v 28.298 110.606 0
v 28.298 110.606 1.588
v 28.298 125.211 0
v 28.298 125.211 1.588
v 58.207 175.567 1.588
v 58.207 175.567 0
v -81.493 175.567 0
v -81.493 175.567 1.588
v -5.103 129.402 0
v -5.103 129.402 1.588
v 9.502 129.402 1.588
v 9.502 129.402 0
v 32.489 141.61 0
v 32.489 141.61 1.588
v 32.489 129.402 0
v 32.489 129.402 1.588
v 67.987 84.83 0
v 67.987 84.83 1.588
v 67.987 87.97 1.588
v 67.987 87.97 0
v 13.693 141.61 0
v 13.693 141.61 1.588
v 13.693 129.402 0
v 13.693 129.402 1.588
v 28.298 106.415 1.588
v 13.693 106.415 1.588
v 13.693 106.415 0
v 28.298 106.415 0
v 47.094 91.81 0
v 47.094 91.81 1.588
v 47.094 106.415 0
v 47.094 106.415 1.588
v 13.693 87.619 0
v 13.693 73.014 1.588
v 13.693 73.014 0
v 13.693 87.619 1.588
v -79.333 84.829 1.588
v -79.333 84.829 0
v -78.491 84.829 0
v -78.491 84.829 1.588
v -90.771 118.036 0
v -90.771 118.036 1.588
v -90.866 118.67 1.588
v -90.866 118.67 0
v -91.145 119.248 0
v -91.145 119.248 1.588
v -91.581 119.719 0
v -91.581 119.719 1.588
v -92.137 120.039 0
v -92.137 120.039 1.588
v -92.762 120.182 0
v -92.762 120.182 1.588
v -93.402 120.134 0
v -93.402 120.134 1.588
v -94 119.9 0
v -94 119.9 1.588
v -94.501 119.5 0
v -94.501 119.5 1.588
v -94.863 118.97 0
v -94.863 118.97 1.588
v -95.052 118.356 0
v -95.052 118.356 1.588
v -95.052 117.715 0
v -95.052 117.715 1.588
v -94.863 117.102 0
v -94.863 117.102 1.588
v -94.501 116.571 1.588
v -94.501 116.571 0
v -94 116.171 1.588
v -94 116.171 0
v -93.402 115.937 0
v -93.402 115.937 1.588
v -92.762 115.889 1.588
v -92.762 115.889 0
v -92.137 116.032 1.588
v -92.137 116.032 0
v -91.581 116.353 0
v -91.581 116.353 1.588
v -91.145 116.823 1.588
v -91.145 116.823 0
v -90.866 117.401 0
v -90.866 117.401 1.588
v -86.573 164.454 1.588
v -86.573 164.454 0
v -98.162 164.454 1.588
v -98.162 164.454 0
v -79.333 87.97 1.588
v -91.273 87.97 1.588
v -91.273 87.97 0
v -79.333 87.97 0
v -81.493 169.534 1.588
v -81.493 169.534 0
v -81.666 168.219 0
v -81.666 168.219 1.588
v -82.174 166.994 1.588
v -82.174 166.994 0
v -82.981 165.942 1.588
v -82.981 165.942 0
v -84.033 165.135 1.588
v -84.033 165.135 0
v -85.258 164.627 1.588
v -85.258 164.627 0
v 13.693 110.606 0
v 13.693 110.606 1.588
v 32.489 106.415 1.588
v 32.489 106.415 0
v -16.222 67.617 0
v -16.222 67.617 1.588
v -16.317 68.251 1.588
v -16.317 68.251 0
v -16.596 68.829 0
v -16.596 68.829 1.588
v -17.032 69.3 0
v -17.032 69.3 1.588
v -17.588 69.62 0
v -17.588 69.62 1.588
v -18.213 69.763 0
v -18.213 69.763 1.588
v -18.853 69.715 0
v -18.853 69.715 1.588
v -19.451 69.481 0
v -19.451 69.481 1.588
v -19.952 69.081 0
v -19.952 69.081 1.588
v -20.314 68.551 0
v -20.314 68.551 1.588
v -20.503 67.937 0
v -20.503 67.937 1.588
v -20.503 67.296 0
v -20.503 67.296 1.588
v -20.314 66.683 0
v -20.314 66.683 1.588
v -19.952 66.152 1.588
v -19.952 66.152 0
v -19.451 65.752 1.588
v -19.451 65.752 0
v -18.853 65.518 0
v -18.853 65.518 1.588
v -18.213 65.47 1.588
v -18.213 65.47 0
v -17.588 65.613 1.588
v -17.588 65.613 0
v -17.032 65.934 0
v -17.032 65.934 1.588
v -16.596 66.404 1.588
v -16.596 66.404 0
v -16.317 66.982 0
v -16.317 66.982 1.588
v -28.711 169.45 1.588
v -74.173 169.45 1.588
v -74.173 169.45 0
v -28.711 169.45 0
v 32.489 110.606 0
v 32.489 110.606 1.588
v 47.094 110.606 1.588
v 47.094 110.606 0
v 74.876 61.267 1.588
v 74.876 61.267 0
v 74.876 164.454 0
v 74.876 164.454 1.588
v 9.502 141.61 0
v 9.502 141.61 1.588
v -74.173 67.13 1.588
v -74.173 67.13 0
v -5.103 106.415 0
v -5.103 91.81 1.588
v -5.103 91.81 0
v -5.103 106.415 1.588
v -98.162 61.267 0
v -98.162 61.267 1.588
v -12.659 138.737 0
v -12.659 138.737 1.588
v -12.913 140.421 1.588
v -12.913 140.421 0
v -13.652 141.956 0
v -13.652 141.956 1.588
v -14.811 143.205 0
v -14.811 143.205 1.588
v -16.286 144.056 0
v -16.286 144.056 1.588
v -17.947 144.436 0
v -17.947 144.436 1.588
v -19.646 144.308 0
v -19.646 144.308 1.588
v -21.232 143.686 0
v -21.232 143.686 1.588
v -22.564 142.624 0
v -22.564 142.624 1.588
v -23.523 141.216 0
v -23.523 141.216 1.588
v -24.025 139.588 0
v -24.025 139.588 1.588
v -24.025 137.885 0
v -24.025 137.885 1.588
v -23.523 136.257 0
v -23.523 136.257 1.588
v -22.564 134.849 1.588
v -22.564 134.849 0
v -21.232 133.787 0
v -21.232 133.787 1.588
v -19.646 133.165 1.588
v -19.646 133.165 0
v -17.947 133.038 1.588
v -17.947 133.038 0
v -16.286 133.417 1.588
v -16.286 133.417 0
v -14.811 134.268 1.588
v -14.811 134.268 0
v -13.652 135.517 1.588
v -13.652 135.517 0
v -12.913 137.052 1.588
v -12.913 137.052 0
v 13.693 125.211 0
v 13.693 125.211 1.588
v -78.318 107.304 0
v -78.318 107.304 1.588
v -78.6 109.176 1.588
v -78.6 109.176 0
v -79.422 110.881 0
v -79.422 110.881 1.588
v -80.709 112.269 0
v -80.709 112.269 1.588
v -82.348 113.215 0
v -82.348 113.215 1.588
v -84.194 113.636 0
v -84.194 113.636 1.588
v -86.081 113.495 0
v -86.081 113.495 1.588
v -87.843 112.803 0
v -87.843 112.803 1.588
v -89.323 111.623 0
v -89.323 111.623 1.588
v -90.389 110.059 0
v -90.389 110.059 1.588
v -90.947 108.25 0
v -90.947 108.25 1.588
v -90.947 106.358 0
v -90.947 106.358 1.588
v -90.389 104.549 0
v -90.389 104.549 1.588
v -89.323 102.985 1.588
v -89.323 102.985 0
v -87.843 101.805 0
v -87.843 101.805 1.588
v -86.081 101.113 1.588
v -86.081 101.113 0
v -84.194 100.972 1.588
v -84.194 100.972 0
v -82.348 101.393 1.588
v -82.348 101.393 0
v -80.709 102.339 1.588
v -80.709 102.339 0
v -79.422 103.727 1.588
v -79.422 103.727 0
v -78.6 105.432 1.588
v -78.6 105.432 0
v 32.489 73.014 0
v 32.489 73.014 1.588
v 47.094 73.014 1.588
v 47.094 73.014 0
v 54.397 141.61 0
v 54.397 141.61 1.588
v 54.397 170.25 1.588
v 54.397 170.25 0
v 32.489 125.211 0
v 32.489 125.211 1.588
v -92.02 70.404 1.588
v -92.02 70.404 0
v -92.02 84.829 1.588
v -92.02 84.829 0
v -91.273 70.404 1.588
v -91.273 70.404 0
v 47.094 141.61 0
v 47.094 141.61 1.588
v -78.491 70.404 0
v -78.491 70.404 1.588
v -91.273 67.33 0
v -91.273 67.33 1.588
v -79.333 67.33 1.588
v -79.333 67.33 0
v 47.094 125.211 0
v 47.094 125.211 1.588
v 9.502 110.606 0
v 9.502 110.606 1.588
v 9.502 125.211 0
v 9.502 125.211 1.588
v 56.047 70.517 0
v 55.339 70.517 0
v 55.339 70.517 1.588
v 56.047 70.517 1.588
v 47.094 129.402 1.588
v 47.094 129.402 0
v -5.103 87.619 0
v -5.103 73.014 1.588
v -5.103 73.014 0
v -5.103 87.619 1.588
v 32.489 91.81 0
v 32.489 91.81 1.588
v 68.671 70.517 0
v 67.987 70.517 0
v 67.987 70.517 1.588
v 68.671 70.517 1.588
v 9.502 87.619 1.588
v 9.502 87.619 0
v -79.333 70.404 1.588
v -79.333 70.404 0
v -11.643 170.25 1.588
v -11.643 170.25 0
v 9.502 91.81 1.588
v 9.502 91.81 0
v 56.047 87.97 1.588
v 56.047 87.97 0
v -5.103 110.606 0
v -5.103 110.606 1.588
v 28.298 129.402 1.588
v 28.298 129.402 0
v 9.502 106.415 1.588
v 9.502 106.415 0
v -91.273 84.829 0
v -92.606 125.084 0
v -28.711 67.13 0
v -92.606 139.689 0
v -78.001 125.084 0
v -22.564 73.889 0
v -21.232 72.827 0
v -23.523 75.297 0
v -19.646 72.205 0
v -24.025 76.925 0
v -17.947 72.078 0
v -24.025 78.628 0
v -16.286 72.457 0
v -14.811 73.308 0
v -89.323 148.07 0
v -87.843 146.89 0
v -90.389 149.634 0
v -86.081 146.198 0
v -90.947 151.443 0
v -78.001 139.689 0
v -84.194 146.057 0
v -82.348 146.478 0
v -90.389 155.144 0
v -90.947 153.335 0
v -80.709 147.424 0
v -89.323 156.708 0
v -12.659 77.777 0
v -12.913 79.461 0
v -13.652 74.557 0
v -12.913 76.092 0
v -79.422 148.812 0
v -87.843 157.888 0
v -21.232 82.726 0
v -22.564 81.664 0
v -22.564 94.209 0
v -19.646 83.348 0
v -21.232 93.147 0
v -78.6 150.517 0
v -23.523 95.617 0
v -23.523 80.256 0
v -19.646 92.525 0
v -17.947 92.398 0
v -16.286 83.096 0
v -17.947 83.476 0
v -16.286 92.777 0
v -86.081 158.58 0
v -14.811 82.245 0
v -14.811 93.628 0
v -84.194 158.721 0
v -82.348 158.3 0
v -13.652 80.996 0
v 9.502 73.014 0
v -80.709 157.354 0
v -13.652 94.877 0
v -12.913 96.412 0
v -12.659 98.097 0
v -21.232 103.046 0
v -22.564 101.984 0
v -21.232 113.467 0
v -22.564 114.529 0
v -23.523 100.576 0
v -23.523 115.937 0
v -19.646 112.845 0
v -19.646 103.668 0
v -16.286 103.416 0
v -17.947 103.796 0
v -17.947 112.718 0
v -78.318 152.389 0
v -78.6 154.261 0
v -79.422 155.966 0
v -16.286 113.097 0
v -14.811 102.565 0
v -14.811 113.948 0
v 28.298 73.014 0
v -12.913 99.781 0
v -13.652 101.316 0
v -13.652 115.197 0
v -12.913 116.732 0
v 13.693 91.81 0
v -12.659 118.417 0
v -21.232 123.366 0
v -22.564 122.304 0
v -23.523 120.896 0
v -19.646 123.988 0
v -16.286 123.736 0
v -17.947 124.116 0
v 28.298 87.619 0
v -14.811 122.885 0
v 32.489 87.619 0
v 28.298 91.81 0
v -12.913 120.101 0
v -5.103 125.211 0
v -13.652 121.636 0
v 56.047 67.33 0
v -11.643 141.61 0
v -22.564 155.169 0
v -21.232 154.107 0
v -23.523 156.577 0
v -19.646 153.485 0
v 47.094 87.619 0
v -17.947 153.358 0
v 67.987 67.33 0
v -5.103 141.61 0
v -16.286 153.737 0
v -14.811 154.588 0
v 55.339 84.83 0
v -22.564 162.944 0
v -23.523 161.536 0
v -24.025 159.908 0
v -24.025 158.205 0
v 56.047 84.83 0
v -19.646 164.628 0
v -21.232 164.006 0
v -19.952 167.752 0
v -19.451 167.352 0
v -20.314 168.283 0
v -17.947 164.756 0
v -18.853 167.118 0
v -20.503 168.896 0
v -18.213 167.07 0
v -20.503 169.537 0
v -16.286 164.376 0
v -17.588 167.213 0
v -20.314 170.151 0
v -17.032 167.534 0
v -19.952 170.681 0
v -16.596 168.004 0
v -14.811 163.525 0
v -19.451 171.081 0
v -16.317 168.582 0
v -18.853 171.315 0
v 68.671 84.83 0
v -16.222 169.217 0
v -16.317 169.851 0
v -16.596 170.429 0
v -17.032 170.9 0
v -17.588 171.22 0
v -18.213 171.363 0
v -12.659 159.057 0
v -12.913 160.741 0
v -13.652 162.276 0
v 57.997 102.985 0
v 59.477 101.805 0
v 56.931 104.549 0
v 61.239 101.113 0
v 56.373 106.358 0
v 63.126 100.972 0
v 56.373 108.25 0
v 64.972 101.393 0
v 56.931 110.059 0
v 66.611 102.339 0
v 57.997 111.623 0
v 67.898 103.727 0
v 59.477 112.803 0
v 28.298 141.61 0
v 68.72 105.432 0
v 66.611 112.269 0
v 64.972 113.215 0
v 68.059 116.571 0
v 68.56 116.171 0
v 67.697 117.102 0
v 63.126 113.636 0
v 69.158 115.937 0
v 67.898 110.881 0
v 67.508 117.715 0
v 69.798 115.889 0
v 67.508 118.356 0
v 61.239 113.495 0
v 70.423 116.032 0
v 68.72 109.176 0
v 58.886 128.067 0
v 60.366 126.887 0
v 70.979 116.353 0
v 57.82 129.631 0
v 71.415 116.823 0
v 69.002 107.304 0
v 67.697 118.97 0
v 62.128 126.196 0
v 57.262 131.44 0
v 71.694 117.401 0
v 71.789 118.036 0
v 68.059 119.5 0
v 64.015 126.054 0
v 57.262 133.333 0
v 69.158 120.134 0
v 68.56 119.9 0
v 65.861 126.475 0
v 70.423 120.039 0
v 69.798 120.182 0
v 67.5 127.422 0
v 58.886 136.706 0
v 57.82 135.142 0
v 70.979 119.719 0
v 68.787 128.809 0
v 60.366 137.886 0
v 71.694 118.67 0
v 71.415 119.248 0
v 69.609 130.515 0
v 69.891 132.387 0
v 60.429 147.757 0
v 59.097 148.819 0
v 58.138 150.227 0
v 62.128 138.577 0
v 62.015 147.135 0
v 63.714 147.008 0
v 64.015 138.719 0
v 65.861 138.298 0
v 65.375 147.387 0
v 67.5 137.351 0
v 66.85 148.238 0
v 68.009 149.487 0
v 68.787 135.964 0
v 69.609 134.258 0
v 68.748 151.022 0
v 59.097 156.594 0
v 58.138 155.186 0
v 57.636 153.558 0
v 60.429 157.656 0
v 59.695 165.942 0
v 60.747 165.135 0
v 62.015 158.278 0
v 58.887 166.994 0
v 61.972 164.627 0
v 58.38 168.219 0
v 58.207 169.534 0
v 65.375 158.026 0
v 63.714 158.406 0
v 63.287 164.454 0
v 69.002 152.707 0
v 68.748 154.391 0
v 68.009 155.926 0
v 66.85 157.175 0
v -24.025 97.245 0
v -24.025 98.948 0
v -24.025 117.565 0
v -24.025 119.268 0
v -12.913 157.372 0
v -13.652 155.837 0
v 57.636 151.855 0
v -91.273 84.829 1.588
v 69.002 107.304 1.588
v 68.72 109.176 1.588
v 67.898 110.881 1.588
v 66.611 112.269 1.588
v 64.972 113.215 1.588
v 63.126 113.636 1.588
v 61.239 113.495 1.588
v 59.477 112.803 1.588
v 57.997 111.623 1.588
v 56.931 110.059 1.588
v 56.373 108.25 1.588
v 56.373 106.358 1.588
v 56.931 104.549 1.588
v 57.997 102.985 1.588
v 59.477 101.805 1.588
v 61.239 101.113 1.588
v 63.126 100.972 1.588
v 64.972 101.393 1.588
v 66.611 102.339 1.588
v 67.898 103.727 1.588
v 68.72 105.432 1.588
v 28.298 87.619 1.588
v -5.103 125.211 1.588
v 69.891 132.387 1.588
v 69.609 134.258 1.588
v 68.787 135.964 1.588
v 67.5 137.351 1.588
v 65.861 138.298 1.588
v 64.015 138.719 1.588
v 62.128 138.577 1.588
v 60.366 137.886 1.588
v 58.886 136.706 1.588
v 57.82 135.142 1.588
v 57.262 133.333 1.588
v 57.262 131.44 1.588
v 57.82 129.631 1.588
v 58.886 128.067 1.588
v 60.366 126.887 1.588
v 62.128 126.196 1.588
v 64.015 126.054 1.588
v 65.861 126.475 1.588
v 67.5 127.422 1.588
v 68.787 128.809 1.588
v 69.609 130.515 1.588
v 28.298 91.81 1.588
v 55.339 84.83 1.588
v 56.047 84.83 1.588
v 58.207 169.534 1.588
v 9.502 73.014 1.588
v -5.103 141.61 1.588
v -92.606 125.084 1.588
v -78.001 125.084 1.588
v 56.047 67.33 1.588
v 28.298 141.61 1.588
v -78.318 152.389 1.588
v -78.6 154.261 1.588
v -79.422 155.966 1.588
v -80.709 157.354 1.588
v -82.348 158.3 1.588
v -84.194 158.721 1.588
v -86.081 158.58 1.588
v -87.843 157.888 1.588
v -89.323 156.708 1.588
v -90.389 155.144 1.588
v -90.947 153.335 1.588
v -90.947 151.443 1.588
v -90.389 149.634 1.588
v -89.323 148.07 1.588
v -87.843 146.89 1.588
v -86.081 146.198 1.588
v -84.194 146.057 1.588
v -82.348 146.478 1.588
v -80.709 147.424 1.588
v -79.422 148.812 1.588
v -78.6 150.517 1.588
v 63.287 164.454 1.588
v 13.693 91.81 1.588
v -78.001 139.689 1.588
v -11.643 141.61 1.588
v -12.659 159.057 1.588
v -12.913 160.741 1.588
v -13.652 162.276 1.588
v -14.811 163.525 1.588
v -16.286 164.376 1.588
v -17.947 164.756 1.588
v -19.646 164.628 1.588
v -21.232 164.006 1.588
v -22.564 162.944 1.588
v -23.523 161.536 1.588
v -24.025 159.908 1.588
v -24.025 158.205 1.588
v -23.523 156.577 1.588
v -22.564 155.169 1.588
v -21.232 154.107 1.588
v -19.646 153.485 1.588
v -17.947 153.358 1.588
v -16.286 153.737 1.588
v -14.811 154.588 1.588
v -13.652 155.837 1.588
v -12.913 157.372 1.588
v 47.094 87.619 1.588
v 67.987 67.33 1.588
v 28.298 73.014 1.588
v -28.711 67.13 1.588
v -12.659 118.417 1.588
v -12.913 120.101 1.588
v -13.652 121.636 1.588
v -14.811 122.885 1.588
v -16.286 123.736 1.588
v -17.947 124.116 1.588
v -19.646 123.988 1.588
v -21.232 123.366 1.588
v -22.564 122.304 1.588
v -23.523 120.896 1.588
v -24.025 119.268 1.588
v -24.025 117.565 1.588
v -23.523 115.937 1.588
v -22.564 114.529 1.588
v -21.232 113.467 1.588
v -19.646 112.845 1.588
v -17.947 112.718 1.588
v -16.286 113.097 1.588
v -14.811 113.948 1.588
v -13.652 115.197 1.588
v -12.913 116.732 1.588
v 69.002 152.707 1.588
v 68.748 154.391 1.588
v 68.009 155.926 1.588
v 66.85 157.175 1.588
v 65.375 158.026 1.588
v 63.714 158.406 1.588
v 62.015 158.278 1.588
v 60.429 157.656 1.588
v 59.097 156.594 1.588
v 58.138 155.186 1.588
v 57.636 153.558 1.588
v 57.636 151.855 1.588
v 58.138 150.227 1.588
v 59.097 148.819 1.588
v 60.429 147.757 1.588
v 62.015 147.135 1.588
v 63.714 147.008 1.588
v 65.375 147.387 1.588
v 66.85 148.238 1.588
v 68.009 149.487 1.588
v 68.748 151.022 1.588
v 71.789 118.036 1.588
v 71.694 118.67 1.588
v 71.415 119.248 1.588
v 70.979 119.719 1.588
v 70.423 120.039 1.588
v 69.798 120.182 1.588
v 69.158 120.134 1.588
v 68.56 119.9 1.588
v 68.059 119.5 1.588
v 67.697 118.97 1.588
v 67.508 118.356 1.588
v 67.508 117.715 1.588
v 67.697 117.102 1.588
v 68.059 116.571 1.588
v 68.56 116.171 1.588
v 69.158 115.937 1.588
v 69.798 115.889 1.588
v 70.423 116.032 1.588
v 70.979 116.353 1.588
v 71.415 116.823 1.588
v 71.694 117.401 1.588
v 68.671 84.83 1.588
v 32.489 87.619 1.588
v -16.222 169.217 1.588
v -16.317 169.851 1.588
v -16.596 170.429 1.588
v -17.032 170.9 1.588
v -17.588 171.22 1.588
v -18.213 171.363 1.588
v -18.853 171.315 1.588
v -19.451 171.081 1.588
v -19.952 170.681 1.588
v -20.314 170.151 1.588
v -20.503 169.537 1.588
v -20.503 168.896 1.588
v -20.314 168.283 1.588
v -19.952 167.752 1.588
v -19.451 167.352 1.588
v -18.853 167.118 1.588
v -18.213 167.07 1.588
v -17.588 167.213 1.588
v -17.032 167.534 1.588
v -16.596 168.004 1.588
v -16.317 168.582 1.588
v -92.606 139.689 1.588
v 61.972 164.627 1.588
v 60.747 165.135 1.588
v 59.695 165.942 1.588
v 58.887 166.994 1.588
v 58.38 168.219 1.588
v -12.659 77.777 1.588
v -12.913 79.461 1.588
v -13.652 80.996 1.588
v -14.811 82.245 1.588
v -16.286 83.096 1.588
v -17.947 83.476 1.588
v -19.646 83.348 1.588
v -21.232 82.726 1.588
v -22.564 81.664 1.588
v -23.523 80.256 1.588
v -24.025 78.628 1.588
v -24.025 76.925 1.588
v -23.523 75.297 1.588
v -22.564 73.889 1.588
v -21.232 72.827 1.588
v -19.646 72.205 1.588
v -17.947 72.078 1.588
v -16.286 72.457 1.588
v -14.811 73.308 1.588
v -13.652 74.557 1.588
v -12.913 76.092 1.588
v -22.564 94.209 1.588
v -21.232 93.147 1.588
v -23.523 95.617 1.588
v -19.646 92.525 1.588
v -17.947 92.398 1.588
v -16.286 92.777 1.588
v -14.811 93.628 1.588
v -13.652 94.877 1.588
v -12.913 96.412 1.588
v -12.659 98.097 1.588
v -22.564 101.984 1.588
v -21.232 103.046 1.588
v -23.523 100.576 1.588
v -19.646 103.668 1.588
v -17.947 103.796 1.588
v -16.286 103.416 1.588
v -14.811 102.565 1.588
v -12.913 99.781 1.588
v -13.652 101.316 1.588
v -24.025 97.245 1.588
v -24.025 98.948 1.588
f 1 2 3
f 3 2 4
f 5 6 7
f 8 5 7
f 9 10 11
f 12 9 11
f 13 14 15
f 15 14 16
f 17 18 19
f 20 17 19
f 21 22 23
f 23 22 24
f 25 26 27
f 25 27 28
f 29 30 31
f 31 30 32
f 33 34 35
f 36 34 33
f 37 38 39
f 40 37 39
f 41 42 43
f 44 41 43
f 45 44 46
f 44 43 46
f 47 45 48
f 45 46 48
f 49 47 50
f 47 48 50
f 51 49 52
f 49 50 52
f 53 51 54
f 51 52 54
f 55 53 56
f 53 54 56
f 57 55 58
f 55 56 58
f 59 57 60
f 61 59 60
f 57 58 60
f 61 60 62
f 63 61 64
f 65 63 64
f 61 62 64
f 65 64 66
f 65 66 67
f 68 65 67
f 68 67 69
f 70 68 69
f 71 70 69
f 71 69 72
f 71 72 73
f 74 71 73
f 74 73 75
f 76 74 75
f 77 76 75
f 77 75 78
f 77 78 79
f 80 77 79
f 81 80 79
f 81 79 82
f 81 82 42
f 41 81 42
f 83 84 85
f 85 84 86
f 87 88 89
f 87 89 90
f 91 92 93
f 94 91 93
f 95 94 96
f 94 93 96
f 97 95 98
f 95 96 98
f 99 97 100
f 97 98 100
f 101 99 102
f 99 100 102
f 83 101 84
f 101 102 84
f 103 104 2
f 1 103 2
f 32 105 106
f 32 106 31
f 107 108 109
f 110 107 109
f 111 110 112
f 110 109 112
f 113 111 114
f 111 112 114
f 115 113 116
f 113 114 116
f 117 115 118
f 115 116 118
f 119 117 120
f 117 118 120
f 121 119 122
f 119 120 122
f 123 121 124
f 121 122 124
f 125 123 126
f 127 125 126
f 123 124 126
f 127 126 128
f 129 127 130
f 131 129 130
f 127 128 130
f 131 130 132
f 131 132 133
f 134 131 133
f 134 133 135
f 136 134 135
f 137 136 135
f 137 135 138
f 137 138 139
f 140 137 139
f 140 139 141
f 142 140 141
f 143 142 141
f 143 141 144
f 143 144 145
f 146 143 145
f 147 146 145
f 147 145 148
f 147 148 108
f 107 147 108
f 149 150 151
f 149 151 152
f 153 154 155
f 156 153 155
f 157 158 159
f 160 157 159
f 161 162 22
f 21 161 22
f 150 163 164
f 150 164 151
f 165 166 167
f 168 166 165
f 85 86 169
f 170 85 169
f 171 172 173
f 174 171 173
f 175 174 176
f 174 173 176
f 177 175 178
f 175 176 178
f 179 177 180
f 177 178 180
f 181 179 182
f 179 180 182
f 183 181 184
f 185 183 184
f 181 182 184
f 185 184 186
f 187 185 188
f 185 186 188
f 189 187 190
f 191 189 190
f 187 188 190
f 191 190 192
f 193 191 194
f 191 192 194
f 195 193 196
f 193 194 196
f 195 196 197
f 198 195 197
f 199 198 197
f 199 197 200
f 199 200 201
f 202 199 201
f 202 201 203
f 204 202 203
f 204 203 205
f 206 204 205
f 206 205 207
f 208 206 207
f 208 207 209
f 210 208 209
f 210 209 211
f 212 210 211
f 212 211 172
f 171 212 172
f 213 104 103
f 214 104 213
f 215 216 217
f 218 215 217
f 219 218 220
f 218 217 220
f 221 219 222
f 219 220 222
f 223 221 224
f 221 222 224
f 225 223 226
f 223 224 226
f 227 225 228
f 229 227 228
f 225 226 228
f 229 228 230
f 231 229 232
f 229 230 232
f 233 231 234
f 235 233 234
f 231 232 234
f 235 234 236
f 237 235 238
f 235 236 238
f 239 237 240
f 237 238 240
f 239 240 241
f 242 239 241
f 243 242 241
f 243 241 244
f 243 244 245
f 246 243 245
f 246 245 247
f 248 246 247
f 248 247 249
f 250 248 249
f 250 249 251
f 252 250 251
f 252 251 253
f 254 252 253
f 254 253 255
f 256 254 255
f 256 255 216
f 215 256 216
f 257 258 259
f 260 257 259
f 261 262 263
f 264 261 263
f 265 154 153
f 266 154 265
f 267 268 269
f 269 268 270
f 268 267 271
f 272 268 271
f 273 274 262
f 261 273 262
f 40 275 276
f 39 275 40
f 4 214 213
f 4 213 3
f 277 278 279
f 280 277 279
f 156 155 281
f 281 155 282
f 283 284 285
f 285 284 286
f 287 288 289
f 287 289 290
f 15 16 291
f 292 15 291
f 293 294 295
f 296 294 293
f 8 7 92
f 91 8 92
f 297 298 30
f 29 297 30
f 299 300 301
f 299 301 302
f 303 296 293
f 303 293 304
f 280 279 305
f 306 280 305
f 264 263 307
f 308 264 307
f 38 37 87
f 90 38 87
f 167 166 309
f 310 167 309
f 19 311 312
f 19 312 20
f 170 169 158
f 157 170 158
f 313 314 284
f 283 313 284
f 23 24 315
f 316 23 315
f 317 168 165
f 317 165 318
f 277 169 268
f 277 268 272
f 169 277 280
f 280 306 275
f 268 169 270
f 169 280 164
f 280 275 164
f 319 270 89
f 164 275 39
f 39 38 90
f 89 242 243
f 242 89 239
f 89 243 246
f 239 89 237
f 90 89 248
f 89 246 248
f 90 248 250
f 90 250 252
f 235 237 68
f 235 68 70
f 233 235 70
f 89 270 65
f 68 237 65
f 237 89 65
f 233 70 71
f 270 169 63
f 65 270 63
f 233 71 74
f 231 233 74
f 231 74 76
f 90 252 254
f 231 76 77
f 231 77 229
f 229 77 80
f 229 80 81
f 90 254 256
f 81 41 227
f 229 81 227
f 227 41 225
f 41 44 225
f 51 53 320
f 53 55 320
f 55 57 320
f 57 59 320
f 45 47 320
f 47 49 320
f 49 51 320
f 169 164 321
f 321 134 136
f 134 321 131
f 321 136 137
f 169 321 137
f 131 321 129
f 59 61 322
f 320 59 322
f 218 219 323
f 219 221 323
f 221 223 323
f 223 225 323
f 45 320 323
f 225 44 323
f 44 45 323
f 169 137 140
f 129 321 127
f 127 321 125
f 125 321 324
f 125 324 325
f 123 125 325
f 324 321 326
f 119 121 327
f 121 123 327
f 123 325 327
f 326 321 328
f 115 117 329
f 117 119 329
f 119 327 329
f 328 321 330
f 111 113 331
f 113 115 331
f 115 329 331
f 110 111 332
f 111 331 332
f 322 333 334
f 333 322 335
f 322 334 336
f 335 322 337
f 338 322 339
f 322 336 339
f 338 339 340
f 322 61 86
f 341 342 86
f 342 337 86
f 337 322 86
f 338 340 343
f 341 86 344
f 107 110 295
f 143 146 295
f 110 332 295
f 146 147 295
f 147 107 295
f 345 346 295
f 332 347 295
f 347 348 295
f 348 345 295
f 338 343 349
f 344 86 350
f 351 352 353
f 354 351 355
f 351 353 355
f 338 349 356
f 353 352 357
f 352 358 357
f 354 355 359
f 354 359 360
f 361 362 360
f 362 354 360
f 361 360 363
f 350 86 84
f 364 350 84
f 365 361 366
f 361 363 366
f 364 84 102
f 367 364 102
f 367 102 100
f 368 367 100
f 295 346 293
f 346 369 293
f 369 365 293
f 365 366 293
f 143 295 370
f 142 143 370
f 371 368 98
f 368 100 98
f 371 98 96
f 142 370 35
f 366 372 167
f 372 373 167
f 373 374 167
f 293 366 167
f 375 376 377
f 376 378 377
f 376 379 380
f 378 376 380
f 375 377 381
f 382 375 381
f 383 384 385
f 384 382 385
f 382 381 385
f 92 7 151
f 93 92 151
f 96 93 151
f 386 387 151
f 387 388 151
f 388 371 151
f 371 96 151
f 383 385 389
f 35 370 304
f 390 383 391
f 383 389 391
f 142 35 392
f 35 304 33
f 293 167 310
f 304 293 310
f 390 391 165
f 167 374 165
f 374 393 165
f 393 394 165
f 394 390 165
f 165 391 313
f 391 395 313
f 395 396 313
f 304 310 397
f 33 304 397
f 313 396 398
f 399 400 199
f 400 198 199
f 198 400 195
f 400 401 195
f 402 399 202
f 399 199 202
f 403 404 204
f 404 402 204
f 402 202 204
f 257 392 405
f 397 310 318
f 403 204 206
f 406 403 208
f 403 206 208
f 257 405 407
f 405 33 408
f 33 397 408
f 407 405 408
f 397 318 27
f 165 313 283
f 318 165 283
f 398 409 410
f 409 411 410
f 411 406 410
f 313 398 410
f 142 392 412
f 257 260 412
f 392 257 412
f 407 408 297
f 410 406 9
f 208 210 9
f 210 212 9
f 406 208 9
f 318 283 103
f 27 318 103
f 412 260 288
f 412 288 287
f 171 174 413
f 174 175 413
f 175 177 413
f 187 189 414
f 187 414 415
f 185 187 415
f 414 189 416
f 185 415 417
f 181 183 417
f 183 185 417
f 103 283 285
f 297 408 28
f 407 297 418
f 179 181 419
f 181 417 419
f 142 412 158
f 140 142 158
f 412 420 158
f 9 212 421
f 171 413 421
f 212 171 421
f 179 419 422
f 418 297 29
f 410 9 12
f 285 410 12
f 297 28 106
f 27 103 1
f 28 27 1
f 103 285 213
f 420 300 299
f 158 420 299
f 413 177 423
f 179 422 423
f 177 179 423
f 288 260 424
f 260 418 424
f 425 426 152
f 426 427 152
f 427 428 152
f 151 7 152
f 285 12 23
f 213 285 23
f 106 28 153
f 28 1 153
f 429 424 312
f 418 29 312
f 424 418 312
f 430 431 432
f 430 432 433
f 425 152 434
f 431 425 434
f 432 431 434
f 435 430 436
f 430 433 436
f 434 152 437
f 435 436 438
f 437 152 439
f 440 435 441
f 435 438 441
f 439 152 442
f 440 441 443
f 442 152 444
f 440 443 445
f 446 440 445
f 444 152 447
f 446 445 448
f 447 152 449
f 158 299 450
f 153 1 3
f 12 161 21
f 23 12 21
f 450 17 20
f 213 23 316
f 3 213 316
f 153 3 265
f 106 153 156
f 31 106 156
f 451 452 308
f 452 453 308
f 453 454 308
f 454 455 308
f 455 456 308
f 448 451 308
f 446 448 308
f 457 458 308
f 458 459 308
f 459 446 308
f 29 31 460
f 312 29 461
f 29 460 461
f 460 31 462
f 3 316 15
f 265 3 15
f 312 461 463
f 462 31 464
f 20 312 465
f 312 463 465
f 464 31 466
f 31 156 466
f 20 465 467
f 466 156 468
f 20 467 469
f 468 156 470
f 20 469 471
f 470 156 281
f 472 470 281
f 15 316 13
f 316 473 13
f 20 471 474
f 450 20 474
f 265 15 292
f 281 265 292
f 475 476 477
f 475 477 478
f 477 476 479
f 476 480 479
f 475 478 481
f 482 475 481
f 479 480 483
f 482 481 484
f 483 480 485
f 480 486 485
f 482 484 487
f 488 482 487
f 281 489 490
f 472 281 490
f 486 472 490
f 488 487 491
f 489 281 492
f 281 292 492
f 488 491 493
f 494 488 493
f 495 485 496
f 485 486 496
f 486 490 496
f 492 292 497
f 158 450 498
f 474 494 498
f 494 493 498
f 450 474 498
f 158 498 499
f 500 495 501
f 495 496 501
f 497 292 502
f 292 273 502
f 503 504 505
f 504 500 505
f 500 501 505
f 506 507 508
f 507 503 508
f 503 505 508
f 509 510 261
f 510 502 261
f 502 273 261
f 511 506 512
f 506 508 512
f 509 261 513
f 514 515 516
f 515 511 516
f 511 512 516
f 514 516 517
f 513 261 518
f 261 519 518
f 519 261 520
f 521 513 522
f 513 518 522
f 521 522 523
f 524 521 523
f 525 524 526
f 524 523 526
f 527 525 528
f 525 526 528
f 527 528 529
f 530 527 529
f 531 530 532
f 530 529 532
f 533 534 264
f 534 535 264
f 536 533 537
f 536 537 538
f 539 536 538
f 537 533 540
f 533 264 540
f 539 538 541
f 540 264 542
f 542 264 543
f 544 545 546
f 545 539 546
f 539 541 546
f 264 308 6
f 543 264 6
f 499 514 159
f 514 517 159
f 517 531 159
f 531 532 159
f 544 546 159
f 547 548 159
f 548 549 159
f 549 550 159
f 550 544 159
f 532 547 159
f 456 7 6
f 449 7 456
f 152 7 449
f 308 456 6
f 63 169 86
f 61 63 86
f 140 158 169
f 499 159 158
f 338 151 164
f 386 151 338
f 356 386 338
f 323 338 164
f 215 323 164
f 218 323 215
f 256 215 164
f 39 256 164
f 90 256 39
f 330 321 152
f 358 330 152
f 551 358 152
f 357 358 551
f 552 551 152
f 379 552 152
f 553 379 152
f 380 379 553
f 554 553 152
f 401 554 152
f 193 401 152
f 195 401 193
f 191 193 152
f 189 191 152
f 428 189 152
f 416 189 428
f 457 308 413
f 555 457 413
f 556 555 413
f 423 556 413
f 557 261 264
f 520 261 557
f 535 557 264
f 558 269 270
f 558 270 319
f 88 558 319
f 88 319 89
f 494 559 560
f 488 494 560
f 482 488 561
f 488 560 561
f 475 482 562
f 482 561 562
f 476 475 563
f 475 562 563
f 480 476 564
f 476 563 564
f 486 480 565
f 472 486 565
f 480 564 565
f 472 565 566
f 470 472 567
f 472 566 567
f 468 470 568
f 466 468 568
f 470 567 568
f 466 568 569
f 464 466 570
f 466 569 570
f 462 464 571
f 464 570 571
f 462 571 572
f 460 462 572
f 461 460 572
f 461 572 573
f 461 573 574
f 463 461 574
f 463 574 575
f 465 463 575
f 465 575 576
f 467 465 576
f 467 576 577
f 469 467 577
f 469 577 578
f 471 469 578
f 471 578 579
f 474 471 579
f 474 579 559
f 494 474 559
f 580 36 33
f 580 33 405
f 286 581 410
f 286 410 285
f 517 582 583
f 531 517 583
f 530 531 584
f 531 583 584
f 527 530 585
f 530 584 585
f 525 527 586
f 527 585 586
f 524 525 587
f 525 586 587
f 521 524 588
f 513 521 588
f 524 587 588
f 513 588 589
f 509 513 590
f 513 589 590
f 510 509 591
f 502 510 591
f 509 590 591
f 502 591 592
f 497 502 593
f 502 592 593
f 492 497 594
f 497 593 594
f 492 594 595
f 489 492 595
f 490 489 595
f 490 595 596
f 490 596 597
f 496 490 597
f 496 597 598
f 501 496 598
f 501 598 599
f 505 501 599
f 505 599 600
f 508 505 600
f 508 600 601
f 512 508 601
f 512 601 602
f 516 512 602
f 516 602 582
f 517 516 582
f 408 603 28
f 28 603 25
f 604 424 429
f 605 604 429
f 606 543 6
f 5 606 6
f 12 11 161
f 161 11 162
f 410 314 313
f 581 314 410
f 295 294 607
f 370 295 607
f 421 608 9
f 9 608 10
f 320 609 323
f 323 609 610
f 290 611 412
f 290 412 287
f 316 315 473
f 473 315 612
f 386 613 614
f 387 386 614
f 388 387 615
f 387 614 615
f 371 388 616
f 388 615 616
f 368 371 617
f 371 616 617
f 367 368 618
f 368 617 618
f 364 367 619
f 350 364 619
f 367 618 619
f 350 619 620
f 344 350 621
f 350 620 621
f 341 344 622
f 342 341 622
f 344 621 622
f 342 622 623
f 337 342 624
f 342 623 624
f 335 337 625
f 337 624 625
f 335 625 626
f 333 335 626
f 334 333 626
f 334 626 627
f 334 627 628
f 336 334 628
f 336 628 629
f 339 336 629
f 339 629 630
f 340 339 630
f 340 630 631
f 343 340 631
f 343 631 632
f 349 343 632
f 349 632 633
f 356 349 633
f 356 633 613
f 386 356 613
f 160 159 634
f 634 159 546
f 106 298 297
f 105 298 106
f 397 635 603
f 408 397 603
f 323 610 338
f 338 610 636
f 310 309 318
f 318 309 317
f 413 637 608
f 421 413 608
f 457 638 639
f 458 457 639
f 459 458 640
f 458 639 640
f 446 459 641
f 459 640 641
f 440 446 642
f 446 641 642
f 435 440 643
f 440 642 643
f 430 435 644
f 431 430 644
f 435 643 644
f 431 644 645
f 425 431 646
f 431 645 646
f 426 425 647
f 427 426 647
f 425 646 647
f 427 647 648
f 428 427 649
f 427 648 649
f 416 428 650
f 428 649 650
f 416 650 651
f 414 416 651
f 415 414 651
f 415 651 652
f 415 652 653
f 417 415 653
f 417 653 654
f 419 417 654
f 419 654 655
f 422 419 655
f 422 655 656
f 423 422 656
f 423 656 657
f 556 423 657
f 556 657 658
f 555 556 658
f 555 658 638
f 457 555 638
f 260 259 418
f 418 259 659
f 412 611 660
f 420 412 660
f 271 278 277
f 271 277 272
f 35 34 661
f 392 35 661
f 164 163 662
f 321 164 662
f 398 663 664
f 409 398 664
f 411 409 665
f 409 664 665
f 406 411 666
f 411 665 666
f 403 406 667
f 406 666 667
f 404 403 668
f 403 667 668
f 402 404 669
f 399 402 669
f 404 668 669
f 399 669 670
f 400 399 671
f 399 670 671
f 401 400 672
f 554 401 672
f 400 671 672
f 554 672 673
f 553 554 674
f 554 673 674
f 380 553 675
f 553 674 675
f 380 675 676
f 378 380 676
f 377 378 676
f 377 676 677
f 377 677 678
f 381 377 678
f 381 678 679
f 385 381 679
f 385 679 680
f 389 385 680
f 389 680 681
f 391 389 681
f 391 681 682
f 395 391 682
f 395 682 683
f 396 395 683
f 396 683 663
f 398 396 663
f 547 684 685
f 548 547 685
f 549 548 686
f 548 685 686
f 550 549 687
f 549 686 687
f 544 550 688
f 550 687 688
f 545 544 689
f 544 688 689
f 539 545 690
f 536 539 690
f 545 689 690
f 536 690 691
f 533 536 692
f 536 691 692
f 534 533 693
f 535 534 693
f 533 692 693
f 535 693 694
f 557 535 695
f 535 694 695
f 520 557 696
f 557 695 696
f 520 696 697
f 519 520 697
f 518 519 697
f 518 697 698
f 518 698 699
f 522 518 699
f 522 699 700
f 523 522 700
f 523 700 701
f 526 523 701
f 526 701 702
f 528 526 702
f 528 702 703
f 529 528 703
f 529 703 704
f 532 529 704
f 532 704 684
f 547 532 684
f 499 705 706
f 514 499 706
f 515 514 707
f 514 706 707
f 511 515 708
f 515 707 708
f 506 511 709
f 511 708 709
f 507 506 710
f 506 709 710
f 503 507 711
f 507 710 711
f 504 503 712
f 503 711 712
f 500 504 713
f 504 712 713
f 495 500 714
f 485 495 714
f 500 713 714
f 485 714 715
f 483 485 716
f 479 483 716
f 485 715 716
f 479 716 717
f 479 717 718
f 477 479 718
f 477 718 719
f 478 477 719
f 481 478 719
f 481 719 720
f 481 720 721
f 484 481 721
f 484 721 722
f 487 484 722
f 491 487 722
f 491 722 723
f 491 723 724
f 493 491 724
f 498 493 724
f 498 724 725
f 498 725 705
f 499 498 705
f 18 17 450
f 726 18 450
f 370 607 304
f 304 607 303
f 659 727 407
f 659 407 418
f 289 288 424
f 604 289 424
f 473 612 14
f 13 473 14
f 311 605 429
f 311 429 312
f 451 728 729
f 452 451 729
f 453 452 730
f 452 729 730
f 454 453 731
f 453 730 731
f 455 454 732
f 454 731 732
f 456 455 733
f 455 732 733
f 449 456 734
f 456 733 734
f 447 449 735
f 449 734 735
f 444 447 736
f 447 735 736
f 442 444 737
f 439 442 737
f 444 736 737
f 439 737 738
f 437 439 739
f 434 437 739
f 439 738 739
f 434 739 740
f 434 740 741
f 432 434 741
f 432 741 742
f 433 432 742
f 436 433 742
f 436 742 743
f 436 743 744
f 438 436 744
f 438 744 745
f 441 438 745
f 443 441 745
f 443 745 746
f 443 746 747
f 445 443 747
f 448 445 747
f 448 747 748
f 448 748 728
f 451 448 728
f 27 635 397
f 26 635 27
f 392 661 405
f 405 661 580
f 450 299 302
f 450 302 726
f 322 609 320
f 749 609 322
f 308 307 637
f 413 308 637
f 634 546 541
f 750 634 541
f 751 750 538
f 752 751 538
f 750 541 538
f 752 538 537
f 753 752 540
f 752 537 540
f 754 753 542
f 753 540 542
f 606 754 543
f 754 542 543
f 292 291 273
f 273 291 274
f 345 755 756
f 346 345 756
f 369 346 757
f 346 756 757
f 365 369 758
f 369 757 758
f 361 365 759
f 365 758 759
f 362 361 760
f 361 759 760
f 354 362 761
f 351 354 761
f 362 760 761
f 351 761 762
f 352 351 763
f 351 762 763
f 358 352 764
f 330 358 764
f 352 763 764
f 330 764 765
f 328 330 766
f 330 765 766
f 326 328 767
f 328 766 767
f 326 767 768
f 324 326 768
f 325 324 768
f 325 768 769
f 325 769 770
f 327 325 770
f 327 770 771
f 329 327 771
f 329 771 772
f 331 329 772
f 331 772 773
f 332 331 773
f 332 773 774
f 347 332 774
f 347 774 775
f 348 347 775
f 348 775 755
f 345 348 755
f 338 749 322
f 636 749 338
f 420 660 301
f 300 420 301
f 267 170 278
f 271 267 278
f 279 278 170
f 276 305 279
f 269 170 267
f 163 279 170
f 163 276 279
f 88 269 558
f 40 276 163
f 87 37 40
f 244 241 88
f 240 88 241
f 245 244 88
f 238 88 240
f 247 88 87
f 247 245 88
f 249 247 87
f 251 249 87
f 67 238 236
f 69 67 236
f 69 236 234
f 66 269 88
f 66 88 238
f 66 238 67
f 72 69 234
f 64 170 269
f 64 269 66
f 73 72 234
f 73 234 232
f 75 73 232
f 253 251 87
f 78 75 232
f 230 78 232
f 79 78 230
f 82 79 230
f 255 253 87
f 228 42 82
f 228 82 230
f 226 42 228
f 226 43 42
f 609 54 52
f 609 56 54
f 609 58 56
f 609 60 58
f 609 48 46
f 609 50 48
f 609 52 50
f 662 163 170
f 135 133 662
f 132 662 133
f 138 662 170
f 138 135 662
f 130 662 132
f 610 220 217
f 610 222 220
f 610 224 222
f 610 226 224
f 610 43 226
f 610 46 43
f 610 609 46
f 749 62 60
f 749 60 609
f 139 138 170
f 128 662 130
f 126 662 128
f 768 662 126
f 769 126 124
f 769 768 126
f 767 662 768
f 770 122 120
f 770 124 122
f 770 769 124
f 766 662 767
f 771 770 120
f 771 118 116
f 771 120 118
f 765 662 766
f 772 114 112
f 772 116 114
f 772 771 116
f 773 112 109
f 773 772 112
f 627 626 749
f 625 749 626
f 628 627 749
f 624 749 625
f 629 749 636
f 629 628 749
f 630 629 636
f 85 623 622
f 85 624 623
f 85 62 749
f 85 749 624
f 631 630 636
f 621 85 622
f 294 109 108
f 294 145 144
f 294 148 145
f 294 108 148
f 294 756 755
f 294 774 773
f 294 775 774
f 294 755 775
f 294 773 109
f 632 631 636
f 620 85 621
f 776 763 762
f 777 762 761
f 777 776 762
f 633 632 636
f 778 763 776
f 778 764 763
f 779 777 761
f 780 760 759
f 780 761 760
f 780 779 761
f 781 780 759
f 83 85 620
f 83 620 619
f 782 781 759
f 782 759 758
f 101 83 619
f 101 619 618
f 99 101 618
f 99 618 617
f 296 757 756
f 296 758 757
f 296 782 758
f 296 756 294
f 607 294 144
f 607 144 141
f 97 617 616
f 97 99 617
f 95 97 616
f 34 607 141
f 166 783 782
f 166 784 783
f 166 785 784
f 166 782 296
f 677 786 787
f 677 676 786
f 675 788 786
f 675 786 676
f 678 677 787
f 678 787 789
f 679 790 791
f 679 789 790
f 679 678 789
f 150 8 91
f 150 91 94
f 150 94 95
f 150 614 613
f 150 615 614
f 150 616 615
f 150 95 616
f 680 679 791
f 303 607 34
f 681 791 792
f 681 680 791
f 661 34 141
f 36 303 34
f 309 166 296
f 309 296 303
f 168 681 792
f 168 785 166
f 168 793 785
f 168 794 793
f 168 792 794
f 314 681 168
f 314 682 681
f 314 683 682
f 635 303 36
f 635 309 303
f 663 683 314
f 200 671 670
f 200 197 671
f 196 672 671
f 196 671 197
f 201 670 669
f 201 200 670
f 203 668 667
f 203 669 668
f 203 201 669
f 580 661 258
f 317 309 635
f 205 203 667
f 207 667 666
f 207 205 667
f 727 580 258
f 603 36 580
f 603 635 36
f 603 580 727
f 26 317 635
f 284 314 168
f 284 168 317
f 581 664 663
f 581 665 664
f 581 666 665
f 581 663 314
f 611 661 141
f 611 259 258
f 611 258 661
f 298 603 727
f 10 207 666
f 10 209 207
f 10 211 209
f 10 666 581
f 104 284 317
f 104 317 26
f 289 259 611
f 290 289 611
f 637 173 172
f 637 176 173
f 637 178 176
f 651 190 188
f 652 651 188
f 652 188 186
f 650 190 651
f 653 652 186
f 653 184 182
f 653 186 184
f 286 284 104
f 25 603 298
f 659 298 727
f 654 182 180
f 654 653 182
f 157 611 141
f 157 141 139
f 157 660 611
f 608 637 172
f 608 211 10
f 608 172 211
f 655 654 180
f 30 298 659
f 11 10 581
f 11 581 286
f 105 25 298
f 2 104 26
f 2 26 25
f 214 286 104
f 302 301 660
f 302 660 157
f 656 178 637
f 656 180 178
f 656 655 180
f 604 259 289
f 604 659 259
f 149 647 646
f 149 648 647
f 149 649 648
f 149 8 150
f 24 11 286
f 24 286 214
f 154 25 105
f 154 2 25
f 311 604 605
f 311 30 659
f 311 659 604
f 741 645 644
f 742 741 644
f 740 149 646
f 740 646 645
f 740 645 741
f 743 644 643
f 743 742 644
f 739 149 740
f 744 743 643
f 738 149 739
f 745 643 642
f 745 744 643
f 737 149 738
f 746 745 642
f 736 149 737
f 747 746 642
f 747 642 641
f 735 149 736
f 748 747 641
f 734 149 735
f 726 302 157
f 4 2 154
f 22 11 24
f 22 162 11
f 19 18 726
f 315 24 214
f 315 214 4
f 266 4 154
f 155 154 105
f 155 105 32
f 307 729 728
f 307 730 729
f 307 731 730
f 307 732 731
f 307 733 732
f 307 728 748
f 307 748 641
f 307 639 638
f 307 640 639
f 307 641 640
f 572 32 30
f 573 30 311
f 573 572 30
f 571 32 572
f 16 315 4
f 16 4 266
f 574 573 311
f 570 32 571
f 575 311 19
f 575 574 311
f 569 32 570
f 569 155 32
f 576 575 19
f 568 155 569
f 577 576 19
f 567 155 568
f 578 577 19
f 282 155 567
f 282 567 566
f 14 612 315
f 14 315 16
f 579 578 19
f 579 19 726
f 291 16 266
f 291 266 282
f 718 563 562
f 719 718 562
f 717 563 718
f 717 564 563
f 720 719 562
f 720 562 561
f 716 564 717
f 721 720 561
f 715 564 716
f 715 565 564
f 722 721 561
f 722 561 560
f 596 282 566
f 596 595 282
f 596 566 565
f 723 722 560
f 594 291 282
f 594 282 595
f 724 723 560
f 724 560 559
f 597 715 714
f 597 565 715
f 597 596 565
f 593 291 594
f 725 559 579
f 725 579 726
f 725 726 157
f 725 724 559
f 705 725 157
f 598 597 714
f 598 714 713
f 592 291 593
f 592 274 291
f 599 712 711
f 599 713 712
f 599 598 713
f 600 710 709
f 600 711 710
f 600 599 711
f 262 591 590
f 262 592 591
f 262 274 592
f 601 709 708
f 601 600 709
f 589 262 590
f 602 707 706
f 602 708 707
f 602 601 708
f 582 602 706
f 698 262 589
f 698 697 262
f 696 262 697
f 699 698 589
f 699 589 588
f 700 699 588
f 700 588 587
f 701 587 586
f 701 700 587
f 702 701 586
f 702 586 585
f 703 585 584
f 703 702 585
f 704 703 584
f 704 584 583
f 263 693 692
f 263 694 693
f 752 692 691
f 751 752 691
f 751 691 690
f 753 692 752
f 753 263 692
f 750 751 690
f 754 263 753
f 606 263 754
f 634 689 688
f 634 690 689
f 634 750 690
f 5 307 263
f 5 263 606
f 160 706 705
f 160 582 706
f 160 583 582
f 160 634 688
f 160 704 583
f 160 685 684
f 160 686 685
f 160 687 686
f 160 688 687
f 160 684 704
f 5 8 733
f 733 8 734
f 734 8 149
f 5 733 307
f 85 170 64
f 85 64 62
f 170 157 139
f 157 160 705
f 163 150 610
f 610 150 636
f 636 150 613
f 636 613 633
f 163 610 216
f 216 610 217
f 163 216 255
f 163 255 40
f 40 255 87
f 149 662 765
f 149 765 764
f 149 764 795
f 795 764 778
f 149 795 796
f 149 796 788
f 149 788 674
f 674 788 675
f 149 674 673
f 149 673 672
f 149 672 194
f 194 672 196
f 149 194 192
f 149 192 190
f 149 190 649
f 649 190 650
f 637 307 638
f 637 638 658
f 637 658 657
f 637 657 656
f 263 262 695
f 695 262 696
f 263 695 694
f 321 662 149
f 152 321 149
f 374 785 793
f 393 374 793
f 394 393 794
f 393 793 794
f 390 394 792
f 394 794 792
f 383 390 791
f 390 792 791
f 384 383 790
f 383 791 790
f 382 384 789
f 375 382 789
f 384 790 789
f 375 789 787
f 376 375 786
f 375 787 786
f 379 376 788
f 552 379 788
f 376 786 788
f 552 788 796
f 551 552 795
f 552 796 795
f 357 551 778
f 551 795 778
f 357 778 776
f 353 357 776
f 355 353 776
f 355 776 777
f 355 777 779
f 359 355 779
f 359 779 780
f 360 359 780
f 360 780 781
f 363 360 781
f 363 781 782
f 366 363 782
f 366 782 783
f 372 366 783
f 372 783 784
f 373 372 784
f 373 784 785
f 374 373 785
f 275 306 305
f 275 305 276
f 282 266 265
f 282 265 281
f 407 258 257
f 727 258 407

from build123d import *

# Parameters (mm, degrees)
BOSS_EXTRUDE1_DEPTH   = 1.5875
SKETCH2_R             = 6.35
SKETCH2_R_2           = 5.715
SKETCH2_W             = 11.94
SKETCH2_H             = 20.64
SKETCH2_W_2           = 14.605
SKETCH2_H_2           = 14.605
SKETCH2_W_3           = 45.462
SKETCH2_H_3           = 102.32
CUT_EXTRUDE1_DEPTH    = 2.5875
F_6_CLEARANCE_HOLE2_D = 4.3053
CUT_EXTRUDE2_START    = -1.5875
SKETCH7_W             = 13.332833865
SKETCH7_H             = 14.312726798
SKETCH7_W_2           = 13.529020254
SKETCH7_H_2           = 14.424558237
CUT_EXTRUDE2_DEPTH    = 1.5875


with BuildPart() as part:
    # Sketch1 → Boss-Extrude1 (new body)
    with BuildSketch(Plane.XY):
        with BuildLine():
            Line((58.206752076, 169.534029068), (58.206752076, 175.566529068))
            Line((58.206752076, 175.566529068), (-81.493247924, 175.566529068))
            Line((-81.493247924, 175.566529068), (-81.493247924, 169.534029068))
            ThreePointArc((-81.493247924, 169.534029068), (-82.981145475, 165.941926619), (-86.573247924, 164.454029068))
            Line((-86.573247924, 164.454029068), (-98.161997924, 164.454029068))
            Line((-98.161997924, 164.454029068), (-98.161997924, 61.266529068))
            Line((-98.161997924, 61.266529068), (74.875502076, 61.266529068))
            Line((74.875502076, 61.266529068), (74.875502076, 164.454029068))
            Line((74.875502076, 164.454029068), (63.286752076, 164.454029068))
            ThreePointArc((63.286752076, 164.454029068), (59.694649628, 165.941926619), (58.206752076, 169.534029068))
        make_face()
    extrude(amount=BOSS_EXTRUDE1_DEPTH)

    # Sketch2 → Cut-Extrude1 (cut, through all)
    with BuildSketch(Plane.XY.offset(1.5875)):
        with Locations((-84.668247924, 152.389029068)):
            Circle(SKETCH2_R)
        with Locations((-84.668247924, 107.304029068)):
            Circle(SKETCH2_R)
        with Locations((63.540752076, 132.386529068)):
            Circle(SKETCH2_R)
        with Locations((62.651752076, 107.304029068)):
            Circle(SKETCH2_R)
        with Locations((-18.374247924, 77.776529068)):
            Circle(SKETCH2_R_2)
        with Locations((-18.374247924, 98.096529068)):
            Circle(SKETCH2_R_2)
        with Locations((-18.374247924, 118.416529068)):
            Circle(SKETCH2_R_2)
        with Locations((-18.374247924, 138.736529068)):
            Circle(SKETCH2_R_2)
        with Locations((-18.374247924, 159.056529068)):
            Circle(SKETCH2_R_2)
        with Locations((63.286752076, 152.706529068)):
            Circle(SKETCH2_R_2)
        with Locations((62.016752076, 77.649529068)):
            Rectangle(SKETCH2_W, SKETCH2_H)
        with Locations((39.791752076, 80.316529068)):
            Rectangle(SKETCH2_W_2, SKETCH2_H_2)
        with Locations((39.791752076, 99.112529068)):
            Rectangle(SKETCH2_W_2, SKETCH2_H_2)
        with Locations((39.791752076, 117.908529068)):
            Rectangle(SKETCH2_W_2, SKETCH2_H_2)
        with Locations((20.995752076, 80.316529068)):
            Rectangle(SKETCH2_W_2, SKETCH2_H_2)
        Polygon((32.489252076, 141.609529068), (32.489252076, 129.402029068), (47.094252076, 129.402029068), (47.094252076, 141.609529068), (54.396752076, 141.609529068), (54.396752076, 170.249529068), (-11.643247924, 170.249529068), (-11.643247924, 141.609529068), (-5.102747924, 141.609529068), (-5.102747924, 129.402029068), (9.502252076, 129.402029068), (9.502252076, 141.609529068), (13.693252076, 141.609529068), (13.693252076, 129.402029068), (28.298252076, 129.402029068), (28.298252076, 141.609529068), align=None)
        with Locations((20.995752076, 99.112529068)):
            Rectangle(SKETCH2_W_2, SKETCH2_H_2)
        with Locations((20.995752076, 117.908529068)):
            Rectangle(SKETCH2_W_2, SKETCH2_H_2)
        with Locations((2.199752076, 117.908529068)):
            Rectangle(SKETCH2_W_2, SKETCH2_H_2)
        with Locations((2.199752076, 99.112529068)):
            Rectangle(SKETCH2_W_2, SKETCH2_H_2)
        with Locations((2.199752076, 80.316529068)):
            Rectangle(SKETCH2_W_2, SKETCH2_H_2)
        with Locations((-85.303247924, 132.386529068)):
            Rectangle(SKETCH2_W_2, SKETCH2_H_2)
        with Locations((-51.442247924, 118.289529068)):
            Rectangle(SKETCH2_W_3, SKETCH2_H_3)
        with Locations((-85.303247924, 77.649529068)):
            Rectangle(SKETCH2_W, SKETCH2_H)
    extrude(amount=-CUT_EXTRUDE1_DEPTH, mode=Mode.SUBTRACT)

    # #6 Clearance Hole2 (through all)
    with Locations(Plane(origin=(-11.643247924, -6.662700632, -3.175), x_dir=(-1, 0, 0), z_dir=(0, 0, -1))):
        with Locations((-81.28, 124.6982297), (6.731, 175.8792297), (81.28, 124.6982297), (6.731, 74.2792297)):
            Hole(F_6_CLEARANCE_HOLE2_D / 2)

    # Sketch7 → Cut-Extrude2 (cut)
    with BuildSketch(Plane.XY.offset(1.5875).offset(CUT_EXTRUDE2_START)):
        with Locations((62.004967044, 77.673806769)):
            Rectangle(SKETCH7_W, SKETCH7_H)
        with Locations((-85.255785181, 77.616484213)):
            Rectangle(SKETCH7_W_2, SKETCH7_H_2)
    extrude(amount=CUT_EXTRUDE2_DEPTH, mode=Mode.SUBTRACT)


solid = part.part
